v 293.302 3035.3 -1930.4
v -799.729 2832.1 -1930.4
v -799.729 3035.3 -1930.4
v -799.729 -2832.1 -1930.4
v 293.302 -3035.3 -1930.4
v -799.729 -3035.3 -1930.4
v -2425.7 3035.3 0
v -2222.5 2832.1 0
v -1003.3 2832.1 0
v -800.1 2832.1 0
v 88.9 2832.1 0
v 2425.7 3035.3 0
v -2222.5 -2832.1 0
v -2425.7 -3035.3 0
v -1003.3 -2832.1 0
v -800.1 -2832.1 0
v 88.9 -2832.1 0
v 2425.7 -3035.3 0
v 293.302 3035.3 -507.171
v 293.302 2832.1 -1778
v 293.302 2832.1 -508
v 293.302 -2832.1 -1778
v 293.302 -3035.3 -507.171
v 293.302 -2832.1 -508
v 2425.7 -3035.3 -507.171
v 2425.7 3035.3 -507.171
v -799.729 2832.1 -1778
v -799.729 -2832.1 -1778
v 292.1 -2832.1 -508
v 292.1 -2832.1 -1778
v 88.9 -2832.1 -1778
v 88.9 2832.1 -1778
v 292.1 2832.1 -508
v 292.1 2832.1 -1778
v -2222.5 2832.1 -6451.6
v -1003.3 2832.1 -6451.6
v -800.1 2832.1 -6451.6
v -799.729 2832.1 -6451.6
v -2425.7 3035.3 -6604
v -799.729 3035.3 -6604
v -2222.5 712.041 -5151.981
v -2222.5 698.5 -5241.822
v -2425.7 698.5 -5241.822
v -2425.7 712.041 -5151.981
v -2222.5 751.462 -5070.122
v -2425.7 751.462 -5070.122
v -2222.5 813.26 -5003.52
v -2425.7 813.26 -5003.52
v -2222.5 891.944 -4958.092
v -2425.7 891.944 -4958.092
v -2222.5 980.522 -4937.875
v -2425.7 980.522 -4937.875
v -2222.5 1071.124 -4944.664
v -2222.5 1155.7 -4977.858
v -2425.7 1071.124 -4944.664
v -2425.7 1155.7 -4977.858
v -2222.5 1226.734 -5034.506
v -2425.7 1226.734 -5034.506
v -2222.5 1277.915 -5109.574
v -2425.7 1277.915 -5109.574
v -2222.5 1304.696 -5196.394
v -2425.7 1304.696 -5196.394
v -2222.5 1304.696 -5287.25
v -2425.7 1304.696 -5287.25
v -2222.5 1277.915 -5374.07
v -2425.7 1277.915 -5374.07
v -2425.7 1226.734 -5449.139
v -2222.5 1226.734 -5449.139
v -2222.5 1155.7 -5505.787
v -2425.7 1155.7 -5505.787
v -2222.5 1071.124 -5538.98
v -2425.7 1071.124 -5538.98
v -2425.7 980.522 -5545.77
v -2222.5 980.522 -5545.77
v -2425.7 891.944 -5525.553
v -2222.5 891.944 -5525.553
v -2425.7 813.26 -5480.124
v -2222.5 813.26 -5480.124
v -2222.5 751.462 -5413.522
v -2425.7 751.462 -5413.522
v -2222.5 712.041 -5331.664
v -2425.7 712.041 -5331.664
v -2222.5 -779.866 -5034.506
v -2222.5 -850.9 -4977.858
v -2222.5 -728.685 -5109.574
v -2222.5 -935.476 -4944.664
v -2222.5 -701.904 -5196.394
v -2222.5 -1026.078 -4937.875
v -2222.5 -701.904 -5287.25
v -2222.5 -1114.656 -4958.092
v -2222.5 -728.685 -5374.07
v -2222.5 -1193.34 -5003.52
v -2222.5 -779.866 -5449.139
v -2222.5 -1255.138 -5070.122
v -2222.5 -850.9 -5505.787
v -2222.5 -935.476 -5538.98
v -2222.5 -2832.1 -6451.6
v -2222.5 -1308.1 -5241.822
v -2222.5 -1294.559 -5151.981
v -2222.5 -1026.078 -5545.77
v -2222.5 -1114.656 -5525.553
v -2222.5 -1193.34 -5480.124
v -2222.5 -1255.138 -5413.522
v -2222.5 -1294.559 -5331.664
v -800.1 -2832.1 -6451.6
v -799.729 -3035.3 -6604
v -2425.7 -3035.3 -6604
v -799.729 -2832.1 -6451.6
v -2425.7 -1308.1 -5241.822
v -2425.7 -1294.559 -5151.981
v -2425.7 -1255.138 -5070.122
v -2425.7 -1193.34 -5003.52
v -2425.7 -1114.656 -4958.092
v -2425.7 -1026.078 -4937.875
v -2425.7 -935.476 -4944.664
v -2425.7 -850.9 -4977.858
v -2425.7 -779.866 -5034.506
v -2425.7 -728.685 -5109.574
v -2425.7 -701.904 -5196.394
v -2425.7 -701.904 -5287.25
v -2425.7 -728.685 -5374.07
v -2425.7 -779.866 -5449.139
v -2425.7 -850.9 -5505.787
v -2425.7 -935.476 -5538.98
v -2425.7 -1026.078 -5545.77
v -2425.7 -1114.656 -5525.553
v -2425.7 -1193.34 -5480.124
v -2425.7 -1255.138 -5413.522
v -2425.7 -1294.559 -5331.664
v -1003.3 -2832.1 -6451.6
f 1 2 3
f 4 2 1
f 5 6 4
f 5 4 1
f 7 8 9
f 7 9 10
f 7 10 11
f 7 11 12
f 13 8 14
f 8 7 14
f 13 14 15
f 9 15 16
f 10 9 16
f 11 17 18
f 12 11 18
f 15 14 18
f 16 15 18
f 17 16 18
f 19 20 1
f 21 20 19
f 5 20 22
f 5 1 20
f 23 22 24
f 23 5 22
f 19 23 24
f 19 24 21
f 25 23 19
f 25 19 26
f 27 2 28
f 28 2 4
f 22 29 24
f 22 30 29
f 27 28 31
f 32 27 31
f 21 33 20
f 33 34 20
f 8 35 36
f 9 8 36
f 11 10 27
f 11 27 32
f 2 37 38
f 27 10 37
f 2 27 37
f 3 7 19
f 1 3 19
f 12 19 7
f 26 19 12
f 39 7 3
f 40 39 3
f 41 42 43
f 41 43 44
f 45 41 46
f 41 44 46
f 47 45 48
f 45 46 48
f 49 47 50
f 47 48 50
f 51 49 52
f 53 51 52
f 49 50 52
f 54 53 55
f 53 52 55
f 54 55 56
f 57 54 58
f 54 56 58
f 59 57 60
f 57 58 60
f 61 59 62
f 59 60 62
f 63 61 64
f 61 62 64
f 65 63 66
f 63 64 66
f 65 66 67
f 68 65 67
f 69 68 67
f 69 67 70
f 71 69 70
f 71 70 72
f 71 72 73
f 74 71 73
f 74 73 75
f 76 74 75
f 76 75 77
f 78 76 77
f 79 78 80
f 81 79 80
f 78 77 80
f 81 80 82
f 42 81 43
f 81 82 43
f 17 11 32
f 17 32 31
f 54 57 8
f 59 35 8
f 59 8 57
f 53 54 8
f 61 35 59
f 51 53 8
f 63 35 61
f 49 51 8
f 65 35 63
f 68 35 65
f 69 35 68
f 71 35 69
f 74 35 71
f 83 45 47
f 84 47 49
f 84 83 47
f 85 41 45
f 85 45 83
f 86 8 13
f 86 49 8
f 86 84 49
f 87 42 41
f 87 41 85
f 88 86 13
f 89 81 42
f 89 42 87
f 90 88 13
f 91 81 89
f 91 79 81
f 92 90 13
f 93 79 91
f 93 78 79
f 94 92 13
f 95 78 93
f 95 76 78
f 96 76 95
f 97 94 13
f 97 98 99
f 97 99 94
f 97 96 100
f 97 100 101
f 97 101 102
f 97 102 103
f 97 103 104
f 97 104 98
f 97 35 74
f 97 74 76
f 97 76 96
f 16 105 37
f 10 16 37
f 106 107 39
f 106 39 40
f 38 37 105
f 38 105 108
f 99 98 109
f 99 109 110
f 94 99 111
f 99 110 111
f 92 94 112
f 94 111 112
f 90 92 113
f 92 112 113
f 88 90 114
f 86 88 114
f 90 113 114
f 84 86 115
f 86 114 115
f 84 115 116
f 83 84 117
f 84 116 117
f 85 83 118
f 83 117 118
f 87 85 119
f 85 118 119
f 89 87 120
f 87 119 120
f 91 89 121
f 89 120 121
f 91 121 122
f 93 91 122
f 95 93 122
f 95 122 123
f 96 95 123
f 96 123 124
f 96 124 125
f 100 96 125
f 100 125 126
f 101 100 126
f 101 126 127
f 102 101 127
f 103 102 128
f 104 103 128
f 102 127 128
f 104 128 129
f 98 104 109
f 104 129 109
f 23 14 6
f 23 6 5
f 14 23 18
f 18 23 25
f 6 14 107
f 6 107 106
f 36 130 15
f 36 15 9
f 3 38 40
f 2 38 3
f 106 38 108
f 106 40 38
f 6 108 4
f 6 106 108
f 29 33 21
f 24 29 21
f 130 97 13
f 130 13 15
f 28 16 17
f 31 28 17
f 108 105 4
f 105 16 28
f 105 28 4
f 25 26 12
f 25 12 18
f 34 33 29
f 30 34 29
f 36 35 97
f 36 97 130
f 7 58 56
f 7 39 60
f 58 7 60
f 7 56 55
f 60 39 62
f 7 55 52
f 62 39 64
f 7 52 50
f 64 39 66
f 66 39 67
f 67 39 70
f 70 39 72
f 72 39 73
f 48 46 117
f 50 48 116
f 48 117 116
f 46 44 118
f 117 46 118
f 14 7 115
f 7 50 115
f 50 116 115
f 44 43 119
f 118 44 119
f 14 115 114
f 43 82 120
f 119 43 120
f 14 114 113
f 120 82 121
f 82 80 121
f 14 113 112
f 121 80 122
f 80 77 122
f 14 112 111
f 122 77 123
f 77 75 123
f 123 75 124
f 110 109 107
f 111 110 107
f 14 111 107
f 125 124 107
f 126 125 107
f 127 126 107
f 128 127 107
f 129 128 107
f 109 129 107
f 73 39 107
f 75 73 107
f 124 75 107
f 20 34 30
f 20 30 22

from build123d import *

# Parameters (mm, degrees)
F0_W      = 4445
F0_H      = 5664.2
F1_DEPTH  = 508
F2_W      = 1219.2
F2_H      = 5664.2
F2_W_2    = 889
F3_DEPTH  = 609.6
F4_W      = 4851.4
F4_H      = 6070.6
F4_W_2    = 4445
F4_H_2    = 5664.2
F5_DEPTH  = 6096
F6_DEPTH  = 508
F8_DEPTH  = 6096
F9_W      = 203.2
F9_H      = 5664.2
F10_DEPTH = 6096
F11_R     = 304.8
F12_DEPTH = 203.2
F13_W     = 3225.4287511826
F13_H     = 4673.6
F14_DEPTH = 6070.601
F15_W     = 2132.3983282566
F15_H     = 1423.2287267685
F16_DEPTH = 6070.601
F18_W     = 1625.9712488174
F18_H     = 6070.6
F19_DEPTH = 152.4
F17_W     = 1093.0304229259
F17_H     = 6070.6
F20_DEPTH = 152.4


with BuildPart() as f1:
    # F0 (on Top) → F1 (new body)
    with BuildSketch(Plane.XY):
        Rectangle(F0_W, F0_H)
    extrude(amount=-F1_DEPTH)

    # F2 (on face) → F3 (cut)
    with BuildSketch(Plane.XY):
        with Locations((-1612.9, 0)):
            Rectangle(F2_W, F2_H)
        with Locations((-355.6, 0)):
            Rectangle(F2_W_2, F2_H)
    extrude(amount=-F3_DEPTH, mode=Mode.SUBTRACT)


with BuildPart() as f5:
    # F4 (on face) → F5 (new body)
    with BuildSketch(Plane(origin=(0, 0, -508), x_dir=(1, 0, 0), z_dir=(0, 0, -1))):
        Rectangle(F4_W, F4_H)
        Rectangle(F4_W_2, F4_H_2, mode=Mode.SUBTRACT)
    extrude(amount=F5_DEPTH)


with BuildPart() as f6:
    # F6 (new): a face of the model
    f6_faces = [f5.part.faces().sort_by_distance(p)[0] for p in [
        (0, -2957.5901123923, -508),
    ]]
    extrude(f6_faces, amount=F6_DEPTH)


with BuildPart() as f1_1:
    add(f1.part)

    # F7: union F5, F6
    add(f5.part)
    add(f6.part)

    # F8 (add): a face of the model
    f8_faces = [f1_1.faces().sort_by_distance(p)[0] for p in [
        (-901.7, 0, -508),
    ]]
    extrude(f8_faces, amount=F8_DEPTH)

    # F9 (on face) → F10 (join)
    with BuildSketch(Plane(origin=(0, 0, -508), x_dir=(1, 0, 0), z_dir=(0, 0, -1))):
        with Locations((190.5, 0)):
            Rectangle(F9_W, F9_H)
    extrude(amount=F10_DEPTH)

    # F11 (on face) → F12 (cut)
    with BuildSketch(Plane(origin=(-2425.7, 0, 0), x_dir=(0, -1, 0), z_dir=(-1, 0, 0))):
        with Locations((-1003.3, -5241.8222427368)):
            Circle(F11_R)
        with Locations((1003.3, -5241.8222427368)):
            Circle(F11_R)
    extrude(amount=-F12_DEPTH, mode=Mode.SUBTRACT)

    # F13 (on face) → F14 (cut, through all)
    with BuildSketch(Plane.XZ.offset(3035.3)):
        with Locations((812.9856244087, -4267.2)):
            Rectangle(F13_W, F13_H)
    extrude(amount=-F14_DEPTH, mode=Mode.SUBTRACT)

    # F15 (on face) → F16 (cut, through all)
    with BuildSketch(Plane.XZ.offset(3035.3)):
        with Locations((1359.5008358717, -1218.7856366158)):
            Rectangle(F15_W, F15_H)
    extrude(amount=-F16_DEPTH, mode=Mode.SUBTRACT)

    # F18 (on face) → F19 (join)
    with BuildSketch(Plane(origin=(0, 0, -6604), x_dir=(1, 0, 0), z_dir=(0, 0, -1))):
        with Locations((-1612.7143755913, 0)):
            Rectangle(F18_W, F18_H)
    extrude(amount=-F19_DEPTH)

    # F17 (on face) → F20 (join)
    with BuildSketch(Plane(origin=(0, 0, -1930.4), x_dir=(1, 0, 0), z_dir=(0, 0, -1))):
        with Locations((-253.2135397196, 0)):
            Rectangle(F17_W, F17_H)
    extrude(amount=-F20_DEPTH)


solid = f1_1.part
